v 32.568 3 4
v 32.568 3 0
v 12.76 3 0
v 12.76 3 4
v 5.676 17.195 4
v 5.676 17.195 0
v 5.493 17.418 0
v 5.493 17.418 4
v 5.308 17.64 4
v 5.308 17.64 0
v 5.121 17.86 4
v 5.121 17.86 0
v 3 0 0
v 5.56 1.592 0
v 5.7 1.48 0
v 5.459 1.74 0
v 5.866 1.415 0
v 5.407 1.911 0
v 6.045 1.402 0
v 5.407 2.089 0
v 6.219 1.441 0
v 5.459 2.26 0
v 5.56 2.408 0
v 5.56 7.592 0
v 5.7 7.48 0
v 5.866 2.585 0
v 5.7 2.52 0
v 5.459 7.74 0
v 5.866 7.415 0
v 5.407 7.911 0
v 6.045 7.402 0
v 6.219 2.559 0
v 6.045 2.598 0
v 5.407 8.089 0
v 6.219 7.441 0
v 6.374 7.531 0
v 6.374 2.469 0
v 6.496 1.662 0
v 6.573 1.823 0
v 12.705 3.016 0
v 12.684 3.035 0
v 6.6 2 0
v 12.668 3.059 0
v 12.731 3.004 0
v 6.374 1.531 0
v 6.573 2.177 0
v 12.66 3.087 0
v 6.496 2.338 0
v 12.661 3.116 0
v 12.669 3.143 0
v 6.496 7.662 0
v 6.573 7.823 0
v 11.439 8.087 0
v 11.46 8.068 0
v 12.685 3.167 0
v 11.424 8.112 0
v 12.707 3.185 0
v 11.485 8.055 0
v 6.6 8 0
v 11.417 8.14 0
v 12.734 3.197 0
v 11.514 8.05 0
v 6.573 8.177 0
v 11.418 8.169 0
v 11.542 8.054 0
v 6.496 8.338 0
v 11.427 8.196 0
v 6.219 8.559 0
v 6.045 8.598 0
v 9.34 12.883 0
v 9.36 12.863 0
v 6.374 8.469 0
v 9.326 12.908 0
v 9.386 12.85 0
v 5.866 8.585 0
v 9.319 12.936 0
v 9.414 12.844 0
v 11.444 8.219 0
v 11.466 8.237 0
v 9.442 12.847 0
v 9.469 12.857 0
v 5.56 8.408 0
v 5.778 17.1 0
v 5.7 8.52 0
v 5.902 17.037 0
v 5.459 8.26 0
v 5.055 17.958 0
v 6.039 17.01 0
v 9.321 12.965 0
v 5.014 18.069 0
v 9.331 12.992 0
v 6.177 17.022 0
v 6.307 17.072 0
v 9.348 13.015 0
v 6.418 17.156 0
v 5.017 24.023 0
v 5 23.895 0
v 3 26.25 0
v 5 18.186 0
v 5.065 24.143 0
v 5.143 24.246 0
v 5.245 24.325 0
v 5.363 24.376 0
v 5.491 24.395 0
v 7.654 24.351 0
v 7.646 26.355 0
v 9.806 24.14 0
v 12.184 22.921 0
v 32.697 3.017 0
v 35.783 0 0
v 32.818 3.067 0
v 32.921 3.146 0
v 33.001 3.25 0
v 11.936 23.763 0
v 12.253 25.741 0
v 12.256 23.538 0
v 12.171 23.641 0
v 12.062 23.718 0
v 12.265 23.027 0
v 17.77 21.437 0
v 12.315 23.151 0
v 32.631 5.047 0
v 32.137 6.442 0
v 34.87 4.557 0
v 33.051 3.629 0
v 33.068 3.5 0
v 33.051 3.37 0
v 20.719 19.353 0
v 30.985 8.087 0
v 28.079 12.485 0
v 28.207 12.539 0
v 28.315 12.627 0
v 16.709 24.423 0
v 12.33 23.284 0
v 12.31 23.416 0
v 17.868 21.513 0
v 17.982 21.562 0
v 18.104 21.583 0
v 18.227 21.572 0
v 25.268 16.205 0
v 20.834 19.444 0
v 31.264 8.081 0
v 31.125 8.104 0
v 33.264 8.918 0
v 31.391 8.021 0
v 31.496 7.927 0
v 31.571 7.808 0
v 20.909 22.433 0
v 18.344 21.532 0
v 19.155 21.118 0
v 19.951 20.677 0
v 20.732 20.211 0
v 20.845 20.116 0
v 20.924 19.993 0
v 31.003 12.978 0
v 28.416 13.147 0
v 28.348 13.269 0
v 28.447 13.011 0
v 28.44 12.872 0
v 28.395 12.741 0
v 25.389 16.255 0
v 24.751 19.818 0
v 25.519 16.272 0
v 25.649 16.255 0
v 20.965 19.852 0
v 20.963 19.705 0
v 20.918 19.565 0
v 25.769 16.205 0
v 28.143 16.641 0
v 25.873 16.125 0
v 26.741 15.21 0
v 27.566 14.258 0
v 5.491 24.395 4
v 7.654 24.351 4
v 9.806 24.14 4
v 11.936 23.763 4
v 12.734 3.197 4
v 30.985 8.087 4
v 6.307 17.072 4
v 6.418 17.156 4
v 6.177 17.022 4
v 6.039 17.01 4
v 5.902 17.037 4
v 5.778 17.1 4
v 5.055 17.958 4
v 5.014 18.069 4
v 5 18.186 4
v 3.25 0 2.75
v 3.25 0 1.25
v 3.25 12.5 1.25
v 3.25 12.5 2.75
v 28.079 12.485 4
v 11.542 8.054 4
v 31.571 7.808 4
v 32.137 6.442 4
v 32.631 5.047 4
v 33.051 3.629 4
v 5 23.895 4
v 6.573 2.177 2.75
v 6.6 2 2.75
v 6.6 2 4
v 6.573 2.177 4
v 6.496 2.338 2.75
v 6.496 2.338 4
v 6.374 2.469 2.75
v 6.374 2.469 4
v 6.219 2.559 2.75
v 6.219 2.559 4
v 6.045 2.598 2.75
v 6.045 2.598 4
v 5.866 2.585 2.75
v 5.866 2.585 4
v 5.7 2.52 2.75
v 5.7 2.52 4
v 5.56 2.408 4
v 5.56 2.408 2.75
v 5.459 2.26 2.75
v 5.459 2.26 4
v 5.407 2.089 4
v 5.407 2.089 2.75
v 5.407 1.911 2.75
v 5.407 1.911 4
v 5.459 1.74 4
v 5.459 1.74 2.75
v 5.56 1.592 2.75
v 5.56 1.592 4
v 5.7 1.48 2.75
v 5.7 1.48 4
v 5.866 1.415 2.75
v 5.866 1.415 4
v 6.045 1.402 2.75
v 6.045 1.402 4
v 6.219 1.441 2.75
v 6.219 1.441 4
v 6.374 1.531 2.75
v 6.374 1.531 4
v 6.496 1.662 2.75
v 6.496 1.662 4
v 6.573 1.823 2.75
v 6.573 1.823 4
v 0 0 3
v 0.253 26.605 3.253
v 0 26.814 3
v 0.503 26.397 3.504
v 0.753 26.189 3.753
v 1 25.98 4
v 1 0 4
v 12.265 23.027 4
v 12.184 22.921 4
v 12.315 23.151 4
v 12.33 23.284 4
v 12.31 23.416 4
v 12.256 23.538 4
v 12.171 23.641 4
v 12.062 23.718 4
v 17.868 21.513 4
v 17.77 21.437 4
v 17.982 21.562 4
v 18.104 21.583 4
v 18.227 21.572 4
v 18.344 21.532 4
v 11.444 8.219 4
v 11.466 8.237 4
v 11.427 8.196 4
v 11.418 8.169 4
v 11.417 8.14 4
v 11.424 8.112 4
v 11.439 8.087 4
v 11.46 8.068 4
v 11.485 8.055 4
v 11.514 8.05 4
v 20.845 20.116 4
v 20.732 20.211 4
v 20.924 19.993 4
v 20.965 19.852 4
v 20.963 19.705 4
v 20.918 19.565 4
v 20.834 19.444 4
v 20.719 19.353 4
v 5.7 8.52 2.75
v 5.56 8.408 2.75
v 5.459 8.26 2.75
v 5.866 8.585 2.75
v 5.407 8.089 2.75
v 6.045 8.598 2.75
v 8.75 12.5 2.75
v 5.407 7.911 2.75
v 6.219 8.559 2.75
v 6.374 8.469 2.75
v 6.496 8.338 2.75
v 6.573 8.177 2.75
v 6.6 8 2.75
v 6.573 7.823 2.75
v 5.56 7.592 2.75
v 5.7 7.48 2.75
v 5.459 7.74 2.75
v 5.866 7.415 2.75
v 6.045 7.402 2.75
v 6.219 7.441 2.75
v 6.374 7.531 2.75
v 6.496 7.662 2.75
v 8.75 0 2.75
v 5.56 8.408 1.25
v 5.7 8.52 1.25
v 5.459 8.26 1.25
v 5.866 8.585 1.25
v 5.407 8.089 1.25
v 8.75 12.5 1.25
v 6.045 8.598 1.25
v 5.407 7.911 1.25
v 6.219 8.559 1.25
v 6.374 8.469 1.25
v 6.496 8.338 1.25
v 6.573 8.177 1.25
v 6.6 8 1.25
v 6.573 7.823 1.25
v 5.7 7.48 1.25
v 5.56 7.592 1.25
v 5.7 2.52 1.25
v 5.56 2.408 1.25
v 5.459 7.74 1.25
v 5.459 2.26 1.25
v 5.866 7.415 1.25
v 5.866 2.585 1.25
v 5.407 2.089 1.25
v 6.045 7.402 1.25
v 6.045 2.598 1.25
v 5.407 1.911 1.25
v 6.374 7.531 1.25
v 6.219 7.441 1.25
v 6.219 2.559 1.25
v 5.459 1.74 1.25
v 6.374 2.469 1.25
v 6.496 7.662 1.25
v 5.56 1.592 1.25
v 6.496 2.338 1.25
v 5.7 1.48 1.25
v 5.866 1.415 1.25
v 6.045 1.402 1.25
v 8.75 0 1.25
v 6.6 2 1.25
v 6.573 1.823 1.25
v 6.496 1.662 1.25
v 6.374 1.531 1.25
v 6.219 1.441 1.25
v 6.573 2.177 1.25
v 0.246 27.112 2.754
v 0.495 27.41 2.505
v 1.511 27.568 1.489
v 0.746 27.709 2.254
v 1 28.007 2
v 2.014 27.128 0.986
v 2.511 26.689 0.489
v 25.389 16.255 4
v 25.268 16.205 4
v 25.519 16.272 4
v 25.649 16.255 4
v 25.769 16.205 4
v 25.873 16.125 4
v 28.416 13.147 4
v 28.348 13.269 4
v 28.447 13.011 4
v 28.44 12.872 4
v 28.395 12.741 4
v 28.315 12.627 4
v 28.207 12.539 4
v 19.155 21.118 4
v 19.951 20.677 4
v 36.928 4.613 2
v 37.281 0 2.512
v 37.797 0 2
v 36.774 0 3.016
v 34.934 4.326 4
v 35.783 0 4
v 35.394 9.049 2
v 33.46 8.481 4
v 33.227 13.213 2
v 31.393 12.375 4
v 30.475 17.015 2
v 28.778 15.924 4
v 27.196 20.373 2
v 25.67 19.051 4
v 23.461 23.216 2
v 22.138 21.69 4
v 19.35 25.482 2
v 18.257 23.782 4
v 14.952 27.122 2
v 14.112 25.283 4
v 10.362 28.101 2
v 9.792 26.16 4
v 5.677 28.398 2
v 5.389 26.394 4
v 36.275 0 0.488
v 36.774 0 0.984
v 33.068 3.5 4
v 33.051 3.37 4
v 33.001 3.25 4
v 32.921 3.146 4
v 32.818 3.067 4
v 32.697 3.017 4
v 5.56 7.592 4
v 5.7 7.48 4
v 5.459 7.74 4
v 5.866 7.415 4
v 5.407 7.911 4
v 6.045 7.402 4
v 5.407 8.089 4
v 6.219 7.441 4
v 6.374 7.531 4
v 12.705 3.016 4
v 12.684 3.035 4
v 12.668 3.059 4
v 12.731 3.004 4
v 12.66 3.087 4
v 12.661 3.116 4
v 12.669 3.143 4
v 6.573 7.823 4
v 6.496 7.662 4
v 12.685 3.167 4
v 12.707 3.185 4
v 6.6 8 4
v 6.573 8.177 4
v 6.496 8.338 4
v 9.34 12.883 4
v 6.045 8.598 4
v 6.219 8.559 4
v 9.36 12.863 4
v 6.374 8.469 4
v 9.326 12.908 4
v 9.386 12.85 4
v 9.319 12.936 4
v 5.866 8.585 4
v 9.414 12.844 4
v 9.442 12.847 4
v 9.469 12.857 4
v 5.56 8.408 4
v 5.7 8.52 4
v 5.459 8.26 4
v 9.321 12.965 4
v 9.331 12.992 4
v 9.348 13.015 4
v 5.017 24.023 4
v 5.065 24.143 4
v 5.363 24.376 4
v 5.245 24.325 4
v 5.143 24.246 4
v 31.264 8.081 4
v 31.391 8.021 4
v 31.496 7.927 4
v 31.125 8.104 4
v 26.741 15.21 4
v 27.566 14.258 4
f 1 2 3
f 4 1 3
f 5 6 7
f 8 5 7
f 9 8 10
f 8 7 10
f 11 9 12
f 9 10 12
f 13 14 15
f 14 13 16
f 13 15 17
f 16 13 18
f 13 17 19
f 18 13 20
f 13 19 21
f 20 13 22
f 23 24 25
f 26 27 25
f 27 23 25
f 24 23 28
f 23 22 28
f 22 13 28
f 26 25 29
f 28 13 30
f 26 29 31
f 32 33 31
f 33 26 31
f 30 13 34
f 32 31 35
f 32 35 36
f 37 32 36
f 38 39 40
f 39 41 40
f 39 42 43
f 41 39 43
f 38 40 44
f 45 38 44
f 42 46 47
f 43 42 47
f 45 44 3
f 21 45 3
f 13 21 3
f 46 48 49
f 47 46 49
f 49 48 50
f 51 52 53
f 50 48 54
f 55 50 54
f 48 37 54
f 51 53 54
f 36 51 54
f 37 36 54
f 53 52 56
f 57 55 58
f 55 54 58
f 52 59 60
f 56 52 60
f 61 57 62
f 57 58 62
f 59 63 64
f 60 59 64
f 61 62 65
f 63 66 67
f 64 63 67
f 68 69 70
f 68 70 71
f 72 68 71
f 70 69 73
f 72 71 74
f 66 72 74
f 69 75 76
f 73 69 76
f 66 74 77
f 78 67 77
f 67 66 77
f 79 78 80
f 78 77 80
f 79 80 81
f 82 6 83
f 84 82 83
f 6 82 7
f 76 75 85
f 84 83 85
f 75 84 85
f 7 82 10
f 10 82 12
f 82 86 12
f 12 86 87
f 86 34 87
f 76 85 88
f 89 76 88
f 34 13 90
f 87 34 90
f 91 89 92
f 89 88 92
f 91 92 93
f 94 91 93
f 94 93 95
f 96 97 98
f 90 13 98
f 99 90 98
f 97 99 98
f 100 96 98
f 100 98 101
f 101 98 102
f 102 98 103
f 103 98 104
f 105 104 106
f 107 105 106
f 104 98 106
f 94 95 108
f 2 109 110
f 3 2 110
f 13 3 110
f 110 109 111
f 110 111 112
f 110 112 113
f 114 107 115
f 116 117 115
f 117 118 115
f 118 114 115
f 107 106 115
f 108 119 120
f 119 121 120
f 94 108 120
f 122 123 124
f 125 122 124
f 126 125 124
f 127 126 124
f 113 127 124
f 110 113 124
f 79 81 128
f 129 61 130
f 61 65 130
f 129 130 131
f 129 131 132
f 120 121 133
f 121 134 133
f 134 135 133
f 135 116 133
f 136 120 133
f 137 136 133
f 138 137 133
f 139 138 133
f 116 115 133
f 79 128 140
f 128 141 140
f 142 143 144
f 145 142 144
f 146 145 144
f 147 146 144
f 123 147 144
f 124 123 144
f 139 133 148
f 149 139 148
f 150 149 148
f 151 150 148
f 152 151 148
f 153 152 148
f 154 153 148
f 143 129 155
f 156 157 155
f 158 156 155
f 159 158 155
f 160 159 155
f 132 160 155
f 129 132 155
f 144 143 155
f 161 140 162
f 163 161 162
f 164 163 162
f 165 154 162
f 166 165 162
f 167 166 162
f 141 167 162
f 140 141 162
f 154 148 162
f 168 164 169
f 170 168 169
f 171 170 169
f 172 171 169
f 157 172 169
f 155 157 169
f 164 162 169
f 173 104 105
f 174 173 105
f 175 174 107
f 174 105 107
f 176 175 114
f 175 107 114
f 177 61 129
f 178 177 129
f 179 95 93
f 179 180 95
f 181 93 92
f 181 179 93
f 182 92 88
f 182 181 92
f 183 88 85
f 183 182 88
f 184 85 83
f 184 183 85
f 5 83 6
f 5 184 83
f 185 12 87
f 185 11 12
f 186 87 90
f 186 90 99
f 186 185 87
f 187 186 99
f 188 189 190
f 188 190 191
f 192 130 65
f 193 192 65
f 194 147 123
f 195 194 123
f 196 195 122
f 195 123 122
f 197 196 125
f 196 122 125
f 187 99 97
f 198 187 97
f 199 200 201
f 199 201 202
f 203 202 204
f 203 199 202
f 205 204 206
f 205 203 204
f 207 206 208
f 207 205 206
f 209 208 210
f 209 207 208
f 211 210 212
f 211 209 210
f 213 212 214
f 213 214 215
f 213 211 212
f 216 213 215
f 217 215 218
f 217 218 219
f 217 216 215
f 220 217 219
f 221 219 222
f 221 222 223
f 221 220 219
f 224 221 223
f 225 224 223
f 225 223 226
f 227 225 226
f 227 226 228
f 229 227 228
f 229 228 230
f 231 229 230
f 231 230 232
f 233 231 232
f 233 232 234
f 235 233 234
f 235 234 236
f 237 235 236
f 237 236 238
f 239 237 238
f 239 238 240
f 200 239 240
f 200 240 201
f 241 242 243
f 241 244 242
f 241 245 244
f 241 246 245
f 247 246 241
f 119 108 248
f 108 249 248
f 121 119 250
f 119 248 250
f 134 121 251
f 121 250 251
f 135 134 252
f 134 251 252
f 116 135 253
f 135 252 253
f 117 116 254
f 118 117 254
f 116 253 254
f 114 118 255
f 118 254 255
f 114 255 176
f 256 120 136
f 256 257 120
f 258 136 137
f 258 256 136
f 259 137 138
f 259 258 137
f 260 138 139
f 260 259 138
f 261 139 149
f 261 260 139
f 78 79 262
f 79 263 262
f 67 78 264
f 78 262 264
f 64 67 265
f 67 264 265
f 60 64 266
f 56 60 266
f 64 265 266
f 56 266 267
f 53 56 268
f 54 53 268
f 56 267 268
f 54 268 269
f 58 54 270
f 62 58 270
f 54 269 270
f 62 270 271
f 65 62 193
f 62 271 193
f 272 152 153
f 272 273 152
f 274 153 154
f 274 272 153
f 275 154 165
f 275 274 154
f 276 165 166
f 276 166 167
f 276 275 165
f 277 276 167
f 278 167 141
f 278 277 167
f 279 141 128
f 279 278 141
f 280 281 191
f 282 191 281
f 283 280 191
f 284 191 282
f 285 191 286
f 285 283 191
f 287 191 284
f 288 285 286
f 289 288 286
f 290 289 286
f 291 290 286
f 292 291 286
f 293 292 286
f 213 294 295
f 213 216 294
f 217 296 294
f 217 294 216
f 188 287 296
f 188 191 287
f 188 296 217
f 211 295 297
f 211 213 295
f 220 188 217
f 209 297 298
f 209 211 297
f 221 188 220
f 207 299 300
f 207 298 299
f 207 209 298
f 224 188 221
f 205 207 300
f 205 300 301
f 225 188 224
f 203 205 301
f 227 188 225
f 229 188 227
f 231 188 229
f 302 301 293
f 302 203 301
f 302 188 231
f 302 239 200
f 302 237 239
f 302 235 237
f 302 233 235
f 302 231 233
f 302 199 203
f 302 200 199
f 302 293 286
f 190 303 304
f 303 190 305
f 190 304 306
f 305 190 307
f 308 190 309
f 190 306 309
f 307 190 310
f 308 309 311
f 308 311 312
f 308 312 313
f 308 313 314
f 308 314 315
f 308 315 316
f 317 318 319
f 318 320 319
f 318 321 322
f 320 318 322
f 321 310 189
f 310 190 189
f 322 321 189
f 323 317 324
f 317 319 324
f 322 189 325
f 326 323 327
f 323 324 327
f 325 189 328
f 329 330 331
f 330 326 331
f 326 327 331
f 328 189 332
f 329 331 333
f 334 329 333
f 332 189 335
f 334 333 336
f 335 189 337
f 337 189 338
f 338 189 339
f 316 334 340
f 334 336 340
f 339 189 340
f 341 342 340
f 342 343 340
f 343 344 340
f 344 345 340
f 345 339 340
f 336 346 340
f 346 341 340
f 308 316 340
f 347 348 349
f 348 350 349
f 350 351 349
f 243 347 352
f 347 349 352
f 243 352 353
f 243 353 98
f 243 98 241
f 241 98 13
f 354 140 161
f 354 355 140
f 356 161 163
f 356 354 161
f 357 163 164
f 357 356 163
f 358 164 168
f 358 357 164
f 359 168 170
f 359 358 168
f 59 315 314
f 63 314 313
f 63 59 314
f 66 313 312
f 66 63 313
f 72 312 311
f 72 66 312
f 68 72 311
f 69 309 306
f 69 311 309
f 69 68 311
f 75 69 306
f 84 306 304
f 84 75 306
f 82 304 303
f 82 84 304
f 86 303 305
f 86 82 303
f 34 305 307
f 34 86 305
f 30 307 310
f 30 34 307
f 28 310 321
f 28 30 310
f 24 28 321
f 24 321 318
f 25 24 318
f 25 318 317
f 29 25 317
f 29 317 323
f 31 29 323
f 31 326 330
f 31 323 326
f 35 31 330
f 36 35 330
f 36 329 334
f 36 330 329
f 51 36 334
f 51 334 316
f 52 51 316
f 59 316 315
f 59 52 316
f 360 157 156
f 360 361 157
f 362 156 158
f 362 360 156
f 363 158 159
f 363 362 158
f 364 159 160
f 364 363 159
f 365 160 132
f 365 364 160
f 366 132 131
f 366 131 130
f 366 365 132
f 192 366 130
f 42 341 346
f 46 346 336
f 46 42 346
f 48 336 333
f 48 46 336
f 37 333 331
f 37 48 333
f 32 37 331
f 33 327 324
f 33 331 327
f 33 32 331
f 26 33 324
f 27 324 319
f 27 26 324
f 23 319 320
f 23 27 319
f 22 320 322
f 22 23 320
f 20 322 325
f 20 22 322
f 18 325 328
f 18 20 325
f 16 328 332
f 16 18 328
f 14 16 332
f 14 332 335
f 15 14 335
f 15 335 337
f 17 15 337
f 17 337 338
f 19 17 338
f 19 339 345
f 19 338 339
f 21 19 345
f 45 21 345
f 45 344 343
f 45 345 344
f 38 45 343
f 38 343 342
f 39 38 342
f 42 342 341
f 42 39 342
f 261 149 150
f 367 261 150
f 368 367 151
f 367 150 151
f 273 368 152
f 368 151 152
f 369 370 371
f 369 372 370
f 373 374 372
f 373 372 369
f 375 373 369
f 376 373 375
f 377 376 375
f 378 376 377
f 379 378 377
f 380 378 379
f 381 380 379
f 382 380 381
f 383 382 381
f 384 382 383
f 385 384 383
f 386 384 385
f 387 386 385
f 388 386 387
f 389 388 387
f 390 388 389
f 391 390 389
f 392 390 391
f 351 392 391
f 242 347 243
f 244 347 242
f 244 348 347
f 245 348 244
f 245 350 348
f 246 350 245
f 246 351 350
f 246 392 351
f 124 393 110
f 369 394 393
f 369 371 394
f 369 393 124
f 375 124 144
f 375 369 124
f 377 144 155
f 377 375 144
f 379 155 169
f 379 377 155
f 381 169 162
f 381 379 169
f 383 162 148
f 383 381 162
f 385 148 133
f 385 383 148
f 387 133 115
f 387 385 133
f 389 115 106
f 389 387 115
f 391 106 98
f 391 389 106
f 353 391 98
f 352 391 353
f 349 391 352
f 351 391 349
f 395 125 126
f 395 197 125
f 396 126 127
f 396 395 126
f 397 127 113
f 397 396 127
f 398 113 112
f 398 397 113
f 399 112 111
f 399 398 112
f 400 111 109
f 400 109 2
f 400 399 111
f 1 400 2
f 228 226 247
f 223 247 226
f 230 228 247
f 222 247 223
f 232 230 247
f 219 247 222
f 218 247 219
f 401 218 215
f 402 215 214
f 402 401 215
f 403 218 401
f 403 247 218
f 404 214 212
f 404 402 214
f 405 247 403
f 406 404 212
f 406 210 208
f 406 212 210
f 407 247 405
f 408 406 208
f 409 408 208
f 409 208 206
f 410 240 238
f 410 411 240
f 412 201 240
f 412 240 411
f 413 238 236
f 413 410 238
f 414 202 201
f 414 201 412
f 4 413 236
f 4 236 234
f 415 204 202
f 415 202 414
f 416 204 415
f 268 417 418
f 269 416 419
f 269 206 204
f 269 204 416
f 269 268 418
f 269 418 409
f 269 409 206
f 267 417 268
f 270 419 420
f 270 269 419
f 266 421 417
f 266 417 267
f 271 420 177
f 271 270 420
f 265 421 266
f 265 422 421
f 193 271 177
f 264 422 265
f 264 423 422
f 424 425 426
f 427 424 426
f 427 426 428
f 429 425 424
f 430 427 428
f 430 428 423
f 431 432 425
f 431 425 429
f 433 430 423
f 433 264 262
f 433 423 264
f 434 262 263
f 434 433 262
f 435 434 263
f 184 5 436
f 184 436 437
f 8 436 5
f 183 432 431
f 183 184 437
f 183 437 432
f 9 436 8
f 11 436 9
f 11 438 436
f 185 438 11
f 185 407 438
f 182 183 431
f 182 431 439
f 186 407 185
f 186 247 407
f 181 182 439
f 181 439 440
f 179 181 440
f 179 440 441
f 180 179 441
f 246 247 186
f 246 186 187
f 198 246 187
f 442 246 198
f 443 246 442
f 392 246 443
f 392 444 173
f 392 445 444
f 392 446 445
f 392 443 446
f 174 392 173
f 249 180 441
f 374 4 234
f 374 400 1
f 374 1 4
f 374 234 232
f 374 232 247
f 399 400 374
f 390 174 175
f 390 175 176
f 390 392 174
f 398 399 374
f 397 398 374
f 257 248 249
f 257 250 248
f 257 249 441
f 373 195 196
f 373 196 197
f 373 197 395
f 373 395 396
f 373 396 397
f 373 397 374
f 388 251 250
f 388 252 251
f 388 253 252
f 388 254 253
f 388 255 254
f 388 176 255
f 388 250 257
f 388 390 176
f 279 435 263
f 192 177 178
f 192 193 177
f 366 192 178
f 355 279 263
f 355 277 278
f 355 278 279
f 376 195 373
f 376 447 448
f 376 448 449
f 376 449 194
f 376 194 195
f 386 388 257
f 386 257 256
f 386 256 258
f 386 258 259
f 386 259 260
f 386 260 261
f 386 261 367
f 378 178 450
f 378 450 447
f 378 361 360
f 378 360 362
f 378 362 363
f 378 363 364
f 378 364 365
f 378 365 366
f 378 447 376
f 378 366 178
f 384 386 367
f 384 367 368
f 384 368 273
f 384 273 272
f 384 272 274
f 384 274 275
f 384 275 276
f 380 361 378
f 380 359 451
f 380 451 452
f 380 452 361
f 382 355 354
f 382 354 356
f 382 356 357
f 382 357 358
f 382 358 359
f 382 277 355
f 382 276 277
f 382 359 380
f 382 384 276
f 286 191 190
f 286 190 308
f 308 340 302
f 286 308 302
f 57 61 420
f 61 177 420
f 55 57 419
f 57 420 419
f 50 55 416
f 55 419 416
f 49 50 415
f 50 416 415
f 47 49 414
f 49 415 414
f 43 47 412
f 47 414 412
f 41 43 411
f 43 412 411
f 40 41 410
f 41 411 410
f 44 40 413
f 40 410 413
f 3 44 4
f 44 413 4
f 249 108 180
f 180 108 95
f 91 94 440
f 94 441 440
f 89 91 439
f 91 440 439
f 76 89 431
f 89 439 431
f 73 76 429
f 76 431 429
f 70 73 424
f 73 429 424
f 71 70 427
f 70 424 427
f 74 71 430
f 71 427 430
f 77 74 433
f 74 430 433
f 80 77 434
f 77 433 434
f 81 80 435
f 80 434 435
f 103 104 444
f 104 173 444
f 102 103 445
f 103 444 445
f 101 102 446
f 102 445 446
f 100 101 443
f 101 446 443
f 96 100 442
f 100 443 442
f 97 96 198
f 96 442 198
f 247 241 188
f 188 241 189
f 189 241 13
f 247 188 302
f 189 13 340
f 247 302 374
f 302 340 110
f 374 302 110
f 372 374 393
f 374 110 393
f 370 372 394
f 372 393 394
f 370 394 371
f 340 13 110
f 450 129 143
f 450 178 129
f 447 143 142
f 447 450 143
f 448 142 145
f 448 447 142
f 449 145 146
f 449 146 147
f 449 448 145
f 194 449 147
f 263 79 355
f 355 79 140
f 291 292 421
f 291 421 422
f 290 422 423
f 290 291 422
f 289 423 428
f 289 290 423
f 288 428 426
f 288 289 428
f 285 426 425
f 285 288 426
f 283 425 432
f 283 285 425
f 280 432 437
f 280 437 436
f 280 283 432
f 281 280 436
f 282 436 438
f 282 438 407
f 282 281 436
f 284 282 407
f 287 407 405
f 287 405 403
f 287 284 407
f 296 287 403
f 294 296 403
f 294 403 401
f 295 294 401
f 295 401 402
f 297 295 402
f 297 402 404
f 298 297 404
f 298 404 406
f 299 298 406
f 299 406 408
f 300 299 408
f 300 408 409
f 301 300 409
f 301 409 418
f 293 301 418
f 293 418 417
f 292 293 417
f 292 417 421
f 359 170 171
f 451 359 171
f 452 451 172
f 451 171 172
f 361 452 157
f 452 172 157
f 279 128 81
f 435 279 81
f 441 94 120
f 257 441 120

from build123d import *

# Parameters (mm, degrees)
SKETCH1_R           = 0.6
BOSS_EXTRUDE1_DEPTH = 4
FILLET3_R           = 0.1
FILLET4_R           = 0.5
SKETCH6_W           = 5.5
SKETCH6_H           = 1.5
CUT_EXTRUDE3_DEPTH  = 12.5
CHAMFER5_SIZE       = 2
CHAMFER6_SIZE       = 2
CHAMFER7_SIZE       = 3
CHAMFER8_SIZE       = 1


with BuildPart() as part:
    # Sketch1 → Boss-Extrude1 (new body)
    with BuildSketch(Plane.XY):
        with BuildLine():
            Line((0, 27.832467291), (0, 0))
            Line((0, 0), (37.79685519, 0))
            ThreePointArc((37.79685519, 0), (24.974482689, 22.16759606), (0, 27.832467291))
        make_face()
        with Locations((6, 2)):
            Circle(SKETCH1_R, mode=Mode.SUBTRACT)
        with Locations((6, 8)):
            Circle(SKETCH1_R, mode=Mode.SUBTRACT)
        with BuildLine():
            Line((33.211027176, 3), (12, 3))
            Line((12, 3), (31.393734472, 8.19653549))
            ThreePointArc((31.393734472, 8.19653549), (32.430403559, 5.643038878), (33.211027176, 3))
        make_face(mode=Mode.SUBTRACT)
        with BuildLine():
            Line((28.785067971, 12.67392631), (10.80845767, 7.857108097))
            Line((10.80845767, 7.857108097), (25.599351889, 16.396634856))
            ThreePointArc((25.599351889, 16.396634856), (27.273796122, 14.605098147), (28.785067971, 12.67392631))
        make_face(mode=Mode.SUBTRACT)
        with BuildLine():
            ThreePointArc((6.022317364, 16.759671956), (5.519466967, 17.386683928), (5, 18))
            Line((5, 18), (5, 24.382137159))
            ThreePointArc((5, 24.382137159), (8.938861294, 24.245342416), (12.819495121, 23.556849712))
            Line((12.819495121, 23.556849712), (6.022317364, 16.759671956))
        make_face(mode=Mode.SUBTRACT)
        with BuildLine():
            ThreePointArc((18.021652475, 21.687939255), (19.760252022, 20.785558519), (21.431506729, 19.763831023))
            Line((21.431506729, 19.763831023), (8.811215985, 12.477502764))
            Line((8.811215985, 12.477502764), (18.021652475, 21.687939255))
        make_face(mode=Mode.SUBTRACT)
    extrude(amount=BOSS_EXTRUDE1_DEPTH)

    # Fillet3
    fillet3_edges = [part.edges().sort_by_distance(p)[0] for p in [
        (12, 3, 2),
        (10.80845767, 7.857108097, 2),
        (8.811215985, 12.477502764, 2),
    ]]
    fillet(fillet3_edges, radius=FILLET3_R)

    # Fillet4
    fillet4_edges = [part.edges().sort_by_distance(p)[0] for p in [
        (6.022317364, 16.759671956, 2),
        (12.819495121, 23.556849712, 2),
        (5, 24.382137159, 2),
        (5, 18, 2),
        (33.211027176, 3, 2),
        (31.393734472, 8.19653549, 2),
        (28.785067971, 12.67392631, 2),
        (25.599351889, 16.396634856, 2),
        (21.431506729, 19.763831023, 2),
        (18.021652475, 21.687939255, 2),
    ]]
    fillet(fillet4_edges, radius=FILLET4_R)

    # Sketch6 → Cut-Extrude3 (cut)
    with BuildSketch(Plane.XZ):
        with Locations((6, 2)):
            Rectangle(SKETCH6_W, SKETCH6_H)
    extrude(amount=-CUT_EXTRUDE3_DEPTH, mode=Mode.SUBTRACT)

    # Chamfer5
    chamfer5_edges = [part.edges().sort_by_distance(p)[0] for p in [
        (24.974482689, 22.16759606, 0),
    ]]
    chamfer(chamfer5_edges, length=CHAMFER5_SIZE)

    # Chamfer6
    chamfer6_edges = [part.edges().sort_by_distance(p)[0] for p in [
        (24.974482689, 22.16759606, 4),
    ]]
    chamfer(chamfer6_edges, length=CHAMFER6_SIZE - 0.0001)  # a hair under: the kernel refuses the full size

    # Chamfer7
    chamfer7_edges = [part.edges().sort_by_distance(p)[0] for p in [
        (0, 12.896938457, 0),
    ]]
    chamfer(chamfer7_edges, length=CHAMFER7_SIZE)

    # Chamfer8
    chamfer8_edges = [part.edges().sort_by_distance(p)[0] for p in [
        (0, 12.896989488, 4),
    ]]
    chamfer(chamfer8_edges, length=CHAMFER8_SIZE - 0.0001)  # a hair under: the kernel refuses the full size


solid = part.part
